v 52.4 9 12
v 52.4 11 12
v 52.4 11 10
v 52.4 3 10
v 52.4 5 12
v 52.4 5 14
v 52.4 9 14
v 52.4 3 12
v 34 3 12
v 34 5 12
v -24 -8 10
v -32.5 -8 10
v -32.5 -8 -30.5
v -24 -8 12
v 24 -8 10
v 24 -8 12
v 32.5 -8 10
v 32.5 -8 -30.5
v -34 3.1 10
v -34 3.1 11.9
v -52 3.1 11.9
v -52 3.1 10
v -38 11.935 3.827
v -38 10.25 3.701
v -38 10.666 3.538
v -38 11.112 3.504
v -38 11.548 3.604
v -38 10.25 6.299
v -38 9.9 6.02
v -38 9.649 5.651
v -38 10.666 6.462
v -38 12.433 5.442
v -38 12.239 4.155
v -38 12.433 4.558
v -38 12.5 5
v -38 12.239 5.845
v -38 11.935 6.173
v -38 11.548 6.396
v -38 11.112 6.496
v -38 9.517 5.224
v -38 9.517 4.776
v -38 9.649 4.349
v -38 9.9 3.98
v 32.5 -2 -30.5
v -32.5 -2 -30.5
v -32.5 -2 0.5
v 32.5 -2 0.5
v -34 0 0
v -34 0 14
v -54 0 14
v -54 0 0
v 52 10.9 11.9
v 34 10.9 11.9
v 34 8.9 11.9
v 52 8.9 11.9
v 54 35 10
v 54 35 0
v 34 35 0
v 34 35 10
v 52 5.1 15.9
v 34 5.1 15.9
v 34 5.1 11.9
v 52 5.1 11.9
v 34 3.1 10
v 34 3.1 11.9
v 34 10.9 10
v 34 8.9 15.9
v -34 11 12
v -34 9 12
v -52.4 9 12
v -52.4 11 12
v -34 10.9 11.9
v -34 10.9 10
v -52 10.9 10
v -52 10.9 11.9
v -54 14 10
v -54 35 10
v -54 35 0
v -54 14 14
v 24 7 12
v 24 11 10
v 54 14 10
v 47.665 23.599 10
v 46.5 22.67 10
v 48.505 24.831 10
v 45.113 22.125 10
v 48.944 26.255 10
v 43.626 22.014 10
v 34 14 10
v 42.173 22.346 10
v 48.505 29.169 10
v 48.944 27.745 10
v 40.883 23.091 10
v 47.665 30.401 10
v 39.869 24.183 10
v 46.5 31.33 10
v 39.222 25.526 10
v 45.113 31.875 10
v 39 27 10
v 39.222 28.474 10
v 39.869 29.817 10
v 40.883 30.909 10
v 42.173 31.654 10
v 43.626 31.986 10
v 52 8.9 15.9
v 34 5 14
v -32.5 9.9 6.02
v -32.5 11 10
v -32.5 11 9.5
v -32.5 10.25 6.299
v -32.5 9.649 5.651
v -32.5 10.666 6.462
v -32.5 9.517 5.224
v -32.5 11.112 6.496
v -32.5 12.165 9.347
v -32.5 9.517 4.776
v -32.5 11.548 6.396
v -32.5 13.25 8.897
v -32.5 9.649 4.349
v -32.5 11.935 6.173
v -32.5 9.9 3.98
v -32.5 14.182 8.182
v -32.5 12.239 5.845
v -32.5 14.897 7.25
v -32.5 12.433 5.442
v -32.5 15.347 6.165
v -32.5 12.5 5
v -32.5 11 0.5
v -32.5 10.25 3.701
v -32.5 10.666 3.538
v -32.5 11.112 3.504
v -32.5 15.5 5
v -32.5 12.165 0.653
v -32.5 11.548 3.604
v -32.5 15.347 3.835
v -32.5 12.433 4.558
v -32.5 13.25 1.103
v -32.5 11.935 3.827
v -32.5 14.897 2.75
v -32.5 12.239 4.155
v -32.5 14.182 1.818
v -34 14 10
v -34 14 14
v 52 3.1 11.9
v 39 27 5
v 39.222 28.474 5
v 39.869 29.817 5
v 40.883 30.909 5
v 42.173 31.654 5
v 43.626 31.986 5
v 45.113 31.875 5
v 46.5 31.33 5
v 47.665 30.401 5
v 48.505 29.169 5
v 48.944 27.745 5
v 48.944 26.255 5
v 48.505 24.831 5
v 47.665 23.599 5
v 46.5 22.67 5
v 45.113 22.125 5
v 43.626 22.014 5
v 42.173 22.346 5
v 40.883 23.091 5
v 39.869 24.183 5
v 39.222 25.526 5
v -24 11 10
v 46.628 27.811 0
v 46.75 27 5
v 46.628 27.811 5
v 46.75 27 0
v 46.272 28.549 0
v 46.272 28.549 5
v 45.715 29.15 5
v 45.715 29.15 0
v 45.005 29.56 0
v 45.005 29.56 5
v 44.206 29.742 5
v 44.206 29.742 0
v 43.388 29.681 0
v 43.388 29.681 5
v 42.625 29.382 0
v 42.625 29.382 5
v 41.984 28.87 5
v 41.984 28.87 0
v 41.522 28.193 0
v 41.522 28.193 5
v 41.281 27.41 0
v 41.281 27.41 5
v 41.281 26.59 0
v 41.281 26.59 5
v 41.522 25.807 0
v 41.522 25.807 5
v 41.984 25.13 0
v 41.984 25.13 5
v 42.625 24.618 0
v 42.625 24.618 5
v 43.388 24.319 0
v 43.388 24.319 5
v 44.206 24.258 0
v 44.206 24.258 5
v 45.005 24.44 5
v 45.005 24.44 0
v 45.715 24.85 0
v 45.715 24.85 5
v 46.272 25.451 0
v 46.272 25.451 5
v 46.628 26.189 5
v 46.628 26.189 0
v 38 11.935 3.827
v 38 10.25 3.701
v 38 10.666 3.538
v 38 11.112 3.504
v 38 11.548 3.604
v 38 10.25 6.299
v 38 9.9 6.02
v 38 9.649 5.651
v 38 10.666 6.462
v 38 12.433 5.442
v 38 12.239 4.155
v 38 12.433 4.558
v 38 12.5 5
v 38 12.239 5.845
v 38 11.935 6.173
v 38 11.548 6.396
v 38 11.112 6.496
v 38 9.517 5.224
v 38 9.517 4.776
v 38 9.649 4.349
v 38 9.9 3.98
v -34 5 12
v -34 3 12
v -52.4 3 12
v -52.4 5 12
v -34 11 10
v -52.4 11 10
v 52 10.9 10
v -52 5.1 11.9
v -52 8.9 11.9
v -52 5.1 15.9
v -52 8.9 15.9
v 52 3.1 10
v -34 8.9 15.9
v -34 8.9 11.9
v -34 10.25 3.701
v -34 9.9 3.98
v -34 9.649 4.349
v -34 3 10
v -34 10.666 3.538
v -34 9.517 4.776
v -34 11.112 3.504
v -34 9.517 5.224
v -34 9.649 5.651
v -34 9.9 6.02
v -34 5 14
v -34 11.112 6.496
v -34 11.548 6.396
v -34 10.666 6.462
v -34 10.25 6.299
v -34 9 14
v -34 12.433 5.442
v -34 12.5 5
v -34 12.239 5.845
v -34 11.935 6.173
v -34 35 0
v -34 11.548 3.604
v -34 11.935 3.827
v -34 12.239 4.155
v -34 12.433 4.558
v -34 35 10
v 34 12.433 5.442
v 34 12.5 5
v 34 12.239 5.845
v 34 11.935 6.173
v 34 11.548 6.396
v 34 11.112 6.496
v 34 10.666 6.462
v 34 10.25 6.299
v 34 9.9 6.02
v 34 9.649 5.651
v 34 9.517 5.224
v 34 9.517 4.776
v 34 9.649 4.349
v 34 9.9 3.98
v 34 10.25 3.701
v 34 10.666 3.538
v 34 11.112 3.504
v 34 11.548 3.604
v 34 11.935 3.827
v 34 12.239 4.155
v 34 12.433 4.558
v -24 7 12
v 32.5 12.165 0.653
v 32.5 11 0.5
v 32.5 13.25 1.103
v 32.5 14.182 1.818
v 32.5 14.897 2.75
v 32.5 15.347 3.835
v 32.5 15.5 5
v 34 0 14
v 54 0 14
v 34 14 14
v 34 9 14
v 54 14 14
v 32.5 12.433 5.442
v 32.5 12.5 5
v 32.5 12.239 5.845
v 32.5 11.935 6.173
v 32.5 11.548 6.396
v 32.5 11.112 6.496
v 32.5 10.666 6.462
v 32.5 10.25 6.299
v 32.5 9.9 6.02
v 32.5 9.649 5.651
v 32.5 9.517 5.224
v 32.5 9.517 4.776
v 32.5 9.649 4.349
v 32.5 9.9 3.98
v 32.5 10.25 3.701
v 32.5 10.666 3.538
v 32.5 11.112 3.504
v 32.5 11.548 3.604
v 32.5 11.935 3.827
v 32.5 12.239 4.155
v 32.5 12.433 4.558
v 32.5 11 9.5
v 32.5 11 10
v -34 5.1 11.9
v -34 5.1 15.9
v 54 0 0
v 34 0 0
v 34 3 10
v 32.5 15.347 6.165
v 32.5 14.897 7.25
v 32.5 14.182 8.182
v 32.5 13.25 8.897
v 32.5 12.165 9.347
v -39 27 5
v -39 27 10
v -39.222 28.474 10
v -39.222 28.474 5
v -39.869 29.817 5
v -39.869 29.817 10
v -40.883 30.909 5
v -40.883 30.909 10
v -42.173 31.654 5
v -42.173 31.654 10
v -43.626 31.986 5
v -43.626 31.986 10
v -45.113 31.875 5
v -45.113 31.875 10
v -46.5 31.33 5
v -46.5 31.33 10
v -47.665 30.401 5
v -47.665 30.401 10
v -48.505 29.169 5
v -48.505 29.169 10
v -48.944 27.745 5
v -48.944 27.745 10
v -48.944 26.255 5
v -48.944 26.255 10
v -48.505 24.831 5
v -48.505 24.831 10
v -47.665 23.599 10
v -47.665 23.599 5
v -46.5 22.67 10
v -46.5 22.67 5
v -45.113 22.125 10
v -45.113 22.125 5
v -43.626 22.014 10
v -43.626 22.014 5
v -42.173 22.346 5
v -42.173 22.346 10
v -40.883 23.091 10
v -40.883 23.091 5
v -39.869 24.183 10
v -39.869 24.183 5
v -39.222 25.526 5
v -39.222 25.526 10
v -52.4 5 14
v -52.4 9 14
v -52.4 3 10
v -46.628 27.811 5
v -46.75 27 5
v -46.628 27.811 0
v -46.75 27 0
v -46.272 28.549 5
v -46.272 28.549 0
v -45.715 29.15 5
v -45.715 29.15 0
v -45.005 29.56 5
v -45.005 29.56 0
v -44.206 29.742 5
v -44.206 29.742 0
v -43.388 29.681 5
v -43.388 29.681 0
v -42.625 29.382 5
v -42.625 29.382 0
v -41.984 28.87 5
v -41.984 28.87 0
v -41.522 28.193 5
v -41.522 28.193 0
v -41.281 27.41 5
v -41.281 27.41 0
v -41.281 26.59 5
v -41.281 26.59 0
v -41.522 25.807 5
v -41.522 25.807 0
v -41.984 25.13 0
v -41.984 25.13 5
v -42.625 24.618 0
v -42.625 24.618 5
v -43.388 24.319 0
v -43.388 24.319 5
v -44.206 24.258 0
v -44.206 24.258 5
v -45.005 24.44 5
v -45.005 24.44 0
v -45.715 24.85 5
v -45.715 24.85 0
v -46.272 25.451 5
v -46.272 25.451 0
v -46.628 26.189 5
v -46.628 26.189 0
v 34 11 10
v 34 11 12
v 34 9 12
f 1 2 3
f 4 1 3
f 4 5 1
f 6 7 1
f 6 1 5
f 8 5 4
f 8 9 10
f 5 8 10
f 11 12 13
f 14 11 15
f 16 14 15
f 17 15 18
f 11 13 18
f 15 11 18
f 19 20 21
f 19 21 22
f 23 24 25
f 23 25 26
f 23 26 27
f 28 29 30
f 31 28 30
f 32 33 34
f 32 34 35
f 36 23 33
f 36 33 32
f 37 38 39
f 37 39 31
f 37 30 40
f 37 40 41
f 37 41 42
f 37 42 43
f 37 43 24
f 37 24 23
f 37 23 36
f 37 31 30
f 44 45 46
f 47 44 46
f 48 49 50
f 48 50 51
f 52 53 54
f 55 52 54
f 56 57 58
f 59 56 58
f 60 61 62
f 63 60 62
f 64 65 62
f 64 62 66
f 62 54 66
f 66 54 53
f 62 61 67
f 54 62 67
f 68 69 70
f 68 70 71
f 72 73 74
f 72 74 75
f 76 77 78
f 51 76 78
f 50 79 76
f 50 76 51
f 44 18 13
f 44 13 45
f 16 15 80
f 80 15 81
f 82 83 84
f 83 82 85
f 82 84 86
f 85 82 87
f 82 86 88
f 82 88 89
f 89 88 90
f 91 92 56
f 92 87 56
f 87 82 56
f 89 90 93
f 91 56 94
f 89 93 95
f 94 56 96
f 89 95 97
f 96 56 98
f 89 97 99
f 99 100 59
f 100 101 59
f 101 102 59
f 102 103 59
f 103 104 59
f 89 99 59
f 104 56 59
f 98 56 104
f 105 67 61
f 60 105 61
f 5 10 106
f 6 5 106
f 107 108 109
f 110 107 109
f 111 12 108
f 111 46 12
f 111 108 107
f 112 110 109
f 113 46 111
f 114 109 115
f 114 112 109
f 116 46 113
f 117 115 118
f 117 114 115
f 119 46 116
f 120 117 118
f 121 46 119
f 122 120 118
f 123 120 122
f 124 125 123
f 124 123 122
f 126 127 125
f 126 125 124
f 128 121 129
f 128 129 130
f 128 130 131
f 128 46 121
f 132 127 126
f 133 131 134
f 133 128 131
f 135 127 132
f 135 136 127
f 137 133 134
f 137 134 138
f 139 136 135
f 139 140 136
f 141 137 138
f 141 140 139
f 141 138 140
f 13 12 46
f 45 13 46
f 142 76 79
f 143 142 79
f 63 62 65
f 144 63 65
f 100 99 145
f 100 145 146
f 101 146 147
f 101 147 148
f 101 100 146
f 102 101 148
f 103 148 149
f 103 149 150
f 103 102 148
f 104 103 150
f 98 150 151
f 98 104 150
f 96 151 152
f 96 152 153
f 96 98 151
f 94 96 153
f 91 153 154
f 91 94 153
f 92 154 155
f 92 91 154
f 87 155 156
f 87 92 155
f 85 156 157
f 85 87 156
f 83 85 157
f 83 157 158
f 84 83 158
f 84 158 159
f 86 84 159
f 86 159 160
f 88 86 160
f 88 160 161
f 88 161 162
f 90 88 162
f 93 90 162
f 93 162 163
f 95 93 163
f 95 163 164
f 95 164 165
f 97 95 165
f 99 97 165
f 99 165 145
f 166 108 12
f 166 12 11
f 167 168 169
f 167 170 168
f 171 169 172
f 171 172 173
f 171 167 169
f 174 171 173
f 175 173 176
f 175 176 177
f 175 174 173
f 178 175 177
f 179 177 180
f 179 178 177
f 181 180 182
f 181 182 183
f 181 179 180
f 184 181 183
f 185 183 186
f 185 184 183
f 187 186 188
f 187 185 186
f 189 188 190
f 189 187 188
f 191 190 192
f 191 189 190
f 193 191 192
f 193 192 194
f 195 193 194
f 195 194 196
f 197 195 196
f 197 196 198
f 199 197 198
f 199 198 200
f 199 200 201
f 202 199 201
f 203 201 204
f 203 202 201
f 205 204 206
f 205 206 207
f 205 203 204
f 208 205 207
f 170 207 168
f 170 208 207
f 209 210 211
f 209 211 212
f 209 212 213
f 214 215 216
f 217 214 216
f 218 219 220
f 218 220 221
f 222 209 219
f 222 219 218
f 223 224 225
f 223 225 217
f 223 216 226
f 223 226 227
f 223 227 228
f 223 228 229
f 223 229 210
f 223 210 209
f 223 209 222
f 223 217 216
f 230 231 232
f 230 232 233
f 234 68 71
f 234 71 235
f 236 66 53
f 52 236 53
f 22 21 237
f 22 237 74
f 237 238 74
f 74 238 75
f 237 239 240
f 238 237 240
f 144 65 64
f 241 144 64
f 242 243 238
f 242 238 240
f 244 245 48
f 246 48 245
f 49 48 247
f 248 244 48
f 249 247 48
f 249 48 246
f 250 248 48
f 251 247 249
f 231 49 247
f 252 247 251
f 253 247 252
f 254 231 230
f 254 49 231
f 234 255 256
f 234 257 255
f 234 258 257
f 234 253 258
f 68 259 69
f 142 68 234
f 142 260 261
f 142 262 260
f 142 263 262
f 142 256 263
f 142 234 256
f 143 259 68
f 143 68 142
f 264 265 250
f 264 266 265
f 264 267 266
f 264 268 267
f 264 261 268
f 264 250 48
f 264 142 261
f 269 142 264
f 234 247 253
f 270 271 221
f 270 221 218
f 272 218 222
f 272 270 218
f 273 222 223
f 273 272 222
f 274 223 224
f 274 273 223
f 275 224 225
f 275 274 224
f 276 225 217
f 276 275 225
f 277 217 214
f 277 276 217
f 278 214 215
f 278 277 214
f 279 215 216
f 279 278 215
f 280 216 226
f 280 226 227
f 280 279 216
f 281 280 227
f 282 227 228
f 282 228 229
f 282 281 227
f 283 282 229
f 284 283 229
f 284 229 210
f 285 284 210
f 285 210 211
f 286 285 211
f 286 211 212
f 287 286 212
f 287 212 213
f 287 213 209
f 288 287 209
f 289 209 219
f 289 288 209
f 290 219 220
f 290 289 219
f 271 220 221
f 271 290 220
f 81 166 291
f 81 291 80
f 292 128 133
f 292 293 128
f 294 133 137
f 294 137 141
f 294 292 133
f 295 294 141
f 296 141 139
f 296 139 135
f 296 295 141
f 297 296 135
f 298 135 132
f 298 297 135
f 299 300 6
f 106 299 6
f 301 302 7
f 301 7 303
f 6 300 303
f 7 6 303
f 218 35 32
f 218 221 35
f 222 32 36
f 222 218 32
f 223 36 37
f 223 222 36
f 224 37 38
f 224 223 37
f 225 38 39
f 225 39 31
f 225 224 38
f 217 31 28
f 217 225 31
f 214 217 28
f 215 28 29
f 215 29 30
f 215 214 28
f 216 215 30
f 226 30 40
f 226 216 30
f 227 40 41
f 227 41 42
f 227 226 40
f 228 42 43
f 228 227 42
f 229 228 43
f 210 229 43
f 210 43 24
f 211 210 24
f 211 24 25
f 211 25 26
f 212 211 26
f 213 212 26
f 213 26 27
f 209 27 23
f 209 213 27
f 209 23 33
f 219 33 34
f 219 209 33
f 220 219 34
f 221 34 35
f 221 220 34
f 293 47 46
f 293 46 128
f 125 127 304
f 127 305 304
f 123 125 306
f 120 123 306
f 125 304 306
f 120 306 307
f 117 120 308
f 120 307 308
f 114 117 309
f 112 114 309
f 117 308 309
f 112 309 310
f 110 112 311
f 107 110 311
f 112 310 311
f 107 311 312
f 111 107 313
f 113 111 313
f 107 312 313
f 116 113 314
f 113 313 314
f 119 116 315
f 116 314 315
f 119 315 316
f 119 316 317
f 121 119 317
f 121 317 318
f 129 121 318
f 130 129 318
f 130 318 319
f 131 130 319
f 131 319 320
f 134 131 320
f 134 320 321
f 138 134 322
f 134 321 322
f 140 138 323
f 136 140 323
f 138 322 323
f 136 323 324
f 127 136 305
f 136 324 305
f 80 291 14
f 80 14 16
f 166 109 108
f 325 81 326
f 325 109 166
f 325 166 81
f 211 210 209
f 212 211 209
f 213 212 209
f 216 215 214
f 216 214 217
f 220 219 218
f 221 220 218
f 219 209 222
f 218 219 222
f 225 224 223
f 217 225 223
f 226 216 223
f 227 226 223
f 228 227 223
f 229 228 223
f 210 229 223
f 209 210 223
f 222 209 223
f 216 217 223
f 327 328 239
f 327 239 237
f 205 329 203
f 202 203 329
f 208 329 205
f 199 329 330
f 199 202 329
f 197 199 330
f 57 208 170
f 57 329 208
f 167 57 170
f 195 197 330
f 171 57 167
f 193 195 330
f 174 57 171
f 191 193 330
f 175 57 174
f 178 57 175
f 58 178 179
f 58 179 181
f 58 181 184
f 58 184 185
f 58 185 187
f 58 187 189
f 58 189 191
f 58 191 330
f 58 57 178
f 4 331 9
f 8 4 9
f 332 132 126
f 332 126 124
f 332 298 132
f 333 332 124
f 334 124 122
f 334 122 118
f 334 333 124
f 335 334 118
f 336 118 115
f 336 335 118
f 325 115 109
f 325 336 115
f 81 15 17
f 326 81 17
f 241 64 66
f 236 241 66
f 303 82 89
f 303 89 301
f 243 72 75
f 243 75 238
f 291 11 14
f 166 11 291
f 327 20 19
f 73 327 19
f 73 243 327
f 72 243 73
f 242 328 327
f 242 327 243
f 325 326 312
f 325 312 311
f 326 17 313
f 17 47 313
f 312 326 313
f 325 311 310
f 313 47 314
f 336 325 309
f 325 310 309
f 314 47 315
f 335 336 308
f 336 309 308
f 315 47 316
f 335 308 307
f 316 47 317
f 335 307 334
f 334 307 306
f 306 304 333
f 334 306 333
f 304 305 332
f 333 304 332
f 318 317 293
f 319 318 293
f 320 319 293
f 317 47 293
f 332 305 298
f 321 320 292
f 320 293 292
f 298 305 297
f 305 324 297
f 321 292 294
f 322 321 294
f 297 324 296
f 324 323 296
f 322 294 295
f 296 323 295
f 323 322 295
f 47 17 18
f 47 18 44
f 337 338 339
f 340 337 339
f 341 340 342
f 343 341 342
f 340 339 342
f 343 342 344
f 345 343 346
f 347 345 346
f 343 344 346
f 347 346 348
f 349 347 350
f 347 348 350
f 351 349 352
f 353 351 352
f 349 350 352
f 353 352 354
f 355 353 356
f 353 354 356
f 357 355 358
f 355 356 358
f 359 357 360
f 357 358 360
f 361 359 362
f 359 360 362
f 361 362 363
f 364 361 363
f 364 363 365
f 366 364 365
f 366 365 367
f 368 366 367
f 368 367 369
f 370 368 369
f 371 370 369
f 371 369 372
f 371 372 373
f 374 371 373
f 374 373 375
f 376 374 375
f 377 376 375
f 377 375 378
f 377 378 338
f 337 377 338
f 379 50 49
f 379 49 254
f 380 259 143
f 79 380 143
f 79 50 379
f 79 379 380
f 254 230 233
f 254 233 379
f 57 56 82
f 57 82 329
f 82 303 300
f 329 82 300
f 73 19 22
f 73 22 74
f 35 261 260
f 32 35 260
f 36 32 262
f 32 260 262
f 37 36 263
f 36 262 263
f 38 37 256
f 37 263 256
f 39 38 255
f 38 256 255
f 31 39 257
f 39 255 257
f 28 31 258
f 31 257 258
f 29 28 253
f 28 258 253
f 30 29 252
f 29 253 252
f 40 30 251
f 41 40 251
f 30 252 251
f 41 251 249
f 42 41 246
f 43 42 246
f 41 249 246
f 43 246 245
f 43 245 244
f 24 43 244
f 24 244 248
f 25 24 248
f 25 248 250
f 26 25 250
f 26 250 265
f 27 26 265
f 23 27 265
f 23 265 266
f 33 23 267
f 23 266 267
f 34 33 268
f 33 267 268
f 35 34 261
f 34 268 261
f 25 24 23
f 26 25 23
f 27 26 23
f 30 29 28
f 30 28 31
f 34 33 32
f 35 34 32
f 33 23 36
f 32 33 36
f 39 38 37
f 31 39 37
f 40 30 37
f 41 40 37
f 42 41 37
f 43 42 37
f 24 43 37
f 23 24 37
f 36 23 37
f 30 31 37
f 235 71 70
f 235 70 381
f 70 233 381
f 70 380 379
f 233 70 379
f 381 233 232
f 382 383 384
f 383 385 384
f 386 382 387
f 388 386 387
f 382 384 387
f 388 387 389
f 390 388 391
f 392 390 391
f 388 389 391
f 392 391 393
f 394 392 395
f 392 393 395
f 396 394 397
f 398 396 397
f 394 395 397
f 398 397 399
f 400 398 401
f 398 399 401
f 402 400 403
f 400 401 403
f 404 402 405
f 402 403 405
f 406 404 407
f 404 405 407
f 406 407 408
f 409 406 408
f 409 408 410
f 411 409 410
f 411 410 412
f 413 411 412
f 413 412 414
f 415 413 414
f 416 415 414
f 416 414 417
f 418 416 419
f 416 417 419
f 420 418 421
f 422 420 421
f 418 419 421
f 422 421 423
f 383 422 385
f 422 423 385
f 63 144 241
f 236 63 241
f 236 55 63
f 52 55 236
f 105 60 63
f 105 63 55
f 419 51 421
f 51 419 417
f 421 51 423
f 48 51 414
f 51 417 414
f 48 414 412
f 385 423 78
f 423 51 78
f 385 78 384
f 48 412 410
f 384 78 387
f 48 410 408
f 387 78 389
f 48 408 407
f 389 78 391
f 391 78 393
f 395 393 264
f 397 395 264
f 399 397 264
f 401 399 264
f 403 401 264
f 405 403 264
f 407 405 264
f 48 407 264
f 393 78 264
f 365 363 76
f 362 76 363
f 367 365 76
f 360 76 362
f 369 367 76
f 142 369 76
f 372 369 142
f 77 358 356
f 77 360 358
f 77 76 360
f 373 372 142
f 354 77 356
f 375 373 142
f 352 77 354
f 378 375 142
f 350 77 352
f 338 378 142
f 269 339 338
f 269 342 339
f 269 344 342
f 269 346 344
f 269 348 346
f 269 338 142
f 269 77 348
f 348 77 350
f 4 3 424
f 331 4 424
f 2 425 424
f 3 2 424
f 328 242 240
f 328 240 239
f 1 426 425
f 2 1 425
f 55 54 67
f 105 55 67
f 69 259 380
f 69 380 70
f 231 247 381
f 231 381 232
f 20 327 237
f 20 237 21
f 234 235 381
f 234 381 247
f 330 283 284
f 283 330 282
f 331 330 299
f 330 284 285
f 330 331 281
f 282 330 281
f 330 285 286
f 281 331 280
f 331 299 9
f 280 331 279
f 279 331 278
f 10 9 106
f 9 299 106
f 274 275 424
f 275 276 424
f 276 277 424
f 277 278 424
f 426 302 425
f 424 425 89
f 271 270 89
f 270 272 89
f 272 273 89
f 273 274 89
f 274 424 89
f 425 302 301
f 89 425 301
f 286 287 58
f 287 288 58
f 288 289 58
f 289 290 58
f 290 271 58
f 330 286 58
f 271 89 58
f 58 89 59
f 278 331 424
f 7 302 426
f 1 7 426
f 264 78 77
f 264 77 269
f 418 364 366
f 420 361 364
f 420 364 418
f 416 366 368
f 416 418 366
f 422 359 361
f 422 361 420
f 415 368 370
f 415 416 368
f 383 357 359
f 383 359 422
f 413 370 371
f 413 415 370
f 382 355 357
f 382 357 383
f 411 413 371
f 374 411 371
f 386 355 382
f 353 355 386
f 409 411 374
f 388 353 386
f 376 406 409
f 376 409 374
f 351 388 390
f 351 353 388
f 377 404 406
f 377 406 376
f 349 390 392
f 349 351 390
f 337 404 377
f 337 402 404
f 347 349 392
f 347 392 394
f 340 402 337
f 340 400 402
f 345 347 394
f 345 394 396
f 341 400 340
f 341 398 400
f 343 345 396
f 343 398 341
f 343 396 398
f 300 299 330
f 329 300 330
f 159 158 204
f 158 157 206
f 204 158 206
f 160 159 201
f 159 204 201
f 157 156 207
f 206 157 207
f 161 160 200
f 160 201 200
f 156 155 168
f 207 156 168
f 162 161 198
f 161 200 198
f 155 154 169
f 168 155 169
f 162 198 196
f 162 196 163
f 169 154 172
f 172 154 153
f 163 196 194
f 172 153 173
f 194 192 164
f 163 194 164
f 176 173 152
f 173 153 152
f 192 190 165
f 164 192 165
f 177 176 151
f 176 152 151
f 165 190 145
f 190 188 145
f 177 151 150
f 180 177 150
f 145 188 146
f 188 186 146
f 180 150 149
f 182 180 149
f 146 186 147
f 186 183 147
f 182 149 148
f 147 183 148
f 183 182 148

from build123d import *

# Parameters (mm, degrees)
F0_W           = 20
F0_H           = 35
F1_DEPTH       = 10
F3_D           = 5.5
F3_CBORE_D     = 10
F3_CBORE_DEPTH = 5
F5_DEPTH       = 20
F6_DEPTH       = 18
F8_DEPTH       = 1.6
F4_R           = 1.5
F9_DEPTH       = 4
F11_R          = 1.5
F12_DEPTH      = 38
F12_DEPTH_BACK = 38
F14_DEPTH      = 32.5
F16_W          = 65
F16_H          = 19
F17_DEPTH      = 0.5
F18_W          = 48
F18_H          = 19
F19_DEPTH      = 2
F20_SIZE2      = 2
F20_SIZE       = 4


# Not quite as in the source:
# - a feature names something its author has since deleted; it is built from what else it names


with BuildPart() as f1:
    # F0 (on Top) → F1 (new body)
    with BuildSketch(Plane.XY):
        with Locations((-44, 17.5)):
            Rectangle(F0_W, F0_H)
    extrude(amount=F1_DEPTH)

    # F3 (through all)
    with Locations(Plane.XY.offset(10)):
        with Locations((-44, 27)):
            CounterBoreHole(F3_D / 2, F3_CBORE_D / 2, F3_CBORE_DEPTH)

    # F4 (on face) → F5 (join, through all)
    with BuildSketch(Plane.YZ.offset(-34)):
        Polygon((0, 14), (0, 10), (3, 10), (3, 12), (5, 12), (5, 14), align=None)
        Polygon((11, 10), (14, 10), (14, 14), (9, 14), (9, 12), (11, 12), align=None)
    extrude(amount=-F5_DEPTH)

    # F7 (on face) → F8 (join)
    with BuildSketch(Plane(origin=(-54, 0, 0), x_dir=(0, -1, 0), z_dir=(-1, 0, 0))):
        Polygon((-5, 14), (-9, 14), (-9, 12), (-11, 12), (-11, 10), (-3, 10), (-3, 12), (-5, 12), align=None)
    extrude(amount=-F8_DEPTH)

    # F4 (on face) → F9 (cut)
    with BuildSketch(Plane.YZ.offset(-34)):
        with Locations((11, 5)):
            Circle(F4_R)
    extrude(amount=-F9_DEPTH, mode=Mode.SUBTRACT)


with BuildPart() as f6:
    # F4 (on face) → F6 (new body)
    with BuildSketch(Plane.YZ.offset(-34)):
        Polygon((3.1, 11.9), (3.1, 10), (7, 10), (10.9, 10), (10.9, 11.9), (8.9, 11.9), (8.9, 15.9), (7, 15.9), (5.1, 15.9), (5.1, 11.9), align=None)
    extrude(amount=-F6_DEPTH)


with BuildPart() as f10_1:
    # F10: instance of F1
    add(f1.part.mirror(Plane.YZ))


with BuildPart() as f10_2:
    # F10: instance of F6
    add(f6.part.mirror(Plane.YZ))


with BuildPart() as f12:
    # F11 (on Right) → F12 (new body, two sides)
    with BuildSketch(Plane.YZ) as f12_sk:
        with Locations((11, 5)):
            Circle(F11_R)
    extrude(amount=F12_DEPTH)
    extrude(f12_sk.sketch, amount=-F12_DEPTH_BACK)


with BuildPart() as f14:
    # F13 (on Right) → F14 (new body, symmetric)
    with BuildSketch(Plane.YZ):
        with BuildLine():
            Line((0, 0.5), (11, 0.5))
            ThreePointArc((11, 0.5), (6.5, 5), (11, 9.5))
            Line((11, 9.5), (-8, 9.5))
            Line((-8, 9.5), (-8, -30.5))
            Line((-8, -30.5), (-2, -30.5))
            Line((-2, -30.5), (-2, 0.5))
            Line((-2, 0.5), (0, 0.5))
        make_face()
        with BuildLine():
            ThreePointArc((11, 9.5), (6.5, 5), (11, 0.5))
            ThreePointArc((11, 0.5), (14.1819805153, 1.8180194847), (15.5, 5))
            ThreePointArc((15.5, 5), (14.1819805153, 8.1819805153), (11, 9.5))
        make_face()
    extrude(amount=F14_DEPTH, both=True)

    # F15: cut F12
    add(f12.part, mode=Mode.SUBTRACT)

    # F16 (on face) → F17 (join, through all)
    with BuildSketch(Plane.XY.offset(9.5)):
        with Locations((0, 1.5)):
            Rectangle(F16_W, F16_H)
    extrude(amount=F17_DEPTH)

    # F18 (on face) → F19 (join)
    with BuildSketch(Plane.XY.offset(10)):
        with Locations((0, 1.5)):
            Rectangle(F18_W, F18_H)
    extrude(amount=F19_DEPTH)

    # F20
    f20_edges = [f14.edges().sort_by_distance(p)[0] for p in [
        (0, 11, 12),
    ]]
    f20_side = f14.faces().sort_by_distance((0, 1.5, 12))[0]
    chamfer(f20_edges, length=F20_SIZE, length2=F20_SIZE2, reference=f20_side)


solid = Compound([f1.part, f6.part, f10_1.part, f10_2.part, f12.part, f14.part])
